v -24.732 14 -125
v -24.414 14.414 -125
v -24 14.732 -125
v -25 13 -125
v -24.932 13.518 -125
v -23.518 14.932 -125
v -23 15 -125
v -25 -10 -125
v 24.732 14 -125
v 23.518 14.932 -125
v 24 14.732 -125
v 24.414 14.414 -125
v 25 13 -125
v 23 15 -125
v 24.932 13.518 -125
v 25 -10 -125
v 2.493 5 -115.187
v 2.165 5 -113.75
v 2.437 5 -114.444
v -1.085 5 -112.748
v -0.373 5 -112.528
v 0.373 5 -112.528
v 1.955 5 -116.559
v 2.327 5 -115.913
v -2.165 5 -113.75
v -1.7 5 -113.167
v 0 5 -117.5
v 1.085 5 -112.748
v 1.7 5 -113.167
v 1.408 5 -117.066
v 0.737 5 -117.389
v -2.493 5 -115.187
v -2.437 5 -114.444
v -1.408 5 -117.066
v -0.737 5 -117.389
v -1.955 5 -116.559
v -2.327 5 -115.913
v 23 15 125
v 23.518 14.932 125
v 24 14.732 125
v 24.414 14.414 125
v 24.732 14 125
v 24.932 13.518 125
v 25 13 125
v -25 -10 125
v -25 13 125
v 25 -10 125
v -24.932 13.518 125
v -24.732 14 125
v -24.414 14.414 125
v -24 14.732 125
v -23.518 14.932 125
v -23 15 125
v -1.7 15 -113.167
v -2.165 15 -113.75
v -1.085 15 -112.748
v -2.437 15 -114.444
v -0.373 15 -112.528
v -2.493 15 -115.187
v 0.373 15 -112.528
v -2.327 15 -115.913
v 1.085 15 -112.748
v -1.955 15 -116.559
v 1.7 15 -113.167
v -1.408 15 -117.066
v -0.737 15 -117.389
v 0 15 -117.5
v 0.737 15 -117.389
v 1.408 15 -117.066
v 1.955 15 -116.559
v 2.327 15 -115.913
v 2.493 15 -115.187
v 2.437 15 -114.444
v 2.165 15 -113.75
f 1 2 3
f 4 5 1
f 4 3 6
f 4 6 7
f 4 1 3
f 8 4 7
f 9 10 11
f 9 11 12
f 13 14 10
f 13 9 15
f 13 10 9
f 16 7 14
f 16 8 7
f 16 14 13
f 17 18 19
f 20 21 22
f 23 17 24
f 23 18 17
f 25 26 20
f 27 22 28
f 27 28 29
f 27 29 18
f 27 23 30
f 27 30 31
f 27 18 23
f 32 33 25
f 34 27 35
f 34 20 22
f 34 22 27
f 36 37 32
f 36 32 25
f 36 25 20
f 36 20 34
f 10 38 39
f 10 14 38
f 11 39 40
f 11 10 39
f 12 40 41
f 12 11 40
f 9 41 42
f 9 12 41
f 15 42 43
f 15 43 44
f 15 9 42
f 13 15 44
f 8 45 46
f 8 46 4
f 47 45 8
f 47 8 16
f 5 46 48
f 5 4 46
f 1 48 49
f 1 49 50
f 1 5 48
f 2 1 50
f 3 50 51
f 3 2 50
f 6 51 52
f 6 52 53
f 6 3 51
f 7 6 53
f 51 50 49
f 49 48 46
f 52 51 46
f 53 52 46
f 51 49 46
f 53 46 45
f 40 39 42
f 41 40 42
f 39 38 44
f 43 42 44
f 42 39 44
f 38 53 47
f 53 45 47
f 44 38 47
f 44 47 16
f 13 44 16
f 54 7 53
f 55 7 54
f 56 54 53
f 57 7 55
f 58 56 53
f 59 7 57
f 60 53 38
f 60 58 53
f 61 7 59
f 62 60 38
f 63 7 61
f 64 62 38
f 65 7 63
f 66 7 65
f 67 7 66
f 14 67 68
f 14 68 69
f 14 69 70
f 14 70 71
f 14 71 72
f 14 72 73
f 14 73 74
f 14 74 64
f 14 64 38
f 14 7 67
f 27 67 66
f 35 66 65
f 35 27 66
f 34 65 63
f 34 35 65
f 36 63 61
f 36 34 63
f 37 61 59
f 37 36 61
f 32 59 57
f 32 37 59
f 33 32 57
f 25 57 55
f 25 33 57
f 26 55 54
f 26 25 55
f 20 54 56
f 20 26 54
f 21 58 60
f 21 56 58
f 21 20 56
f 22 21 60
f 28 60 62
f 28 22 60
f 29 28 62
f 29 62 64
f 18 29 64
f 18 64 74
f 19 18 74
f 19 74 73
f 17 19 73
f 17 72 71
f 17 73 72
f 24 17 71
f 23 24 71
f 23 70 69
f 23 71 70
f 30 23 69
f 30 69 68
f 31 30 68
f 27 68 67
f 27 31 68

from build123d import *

# Parameters (mm, degrees)
SKETCH1_W               = 50
SKETCH1_H               = 20
BOSS_EXTRUDE1_DEPTH     = 125
SKETCH3_W               = 50
SKETCH3_H               = 250
BOSS_EXTRUDE2_DEPTH     = 5
CUT_EXTRUDE1_DEPTH      = 130.903810568
CUT_EXTRUDE1_DEPTH_BACK = 10
SKETCH2_R               = 2.5
FILLET1_R               = 2


with BuildPart() as part:
    # Sketch1 → Boss-Extrude1 (new, symmetric)
    with BuildSketch(Plane.XY):
        Rectangle(SKETCH1_W, SKETCH1_H)
    extrude(amount=BOSS_EXTRUDE1_DEPTH, both=True)

    # Sketch3 → Boss-Extrude2 (add)
    with BuildSketch(Plane(origin=(0, 10, 0), x_dir=(1, 0, 0), z_dir=(0, 1, 0))):
        Rectangle(SKETCH3_W, SKETCH3_H)
    extrude(amount=BOSS_EXTRUDE2_DEPTH)

    # Sketch2 → Cut-Extrude1 (cut, two sides: drawn at the far end of the back side and taken through both)
    with BuildSketch(Plane(origin=(0, 15, 0), x_dir=(1, 0, 0), z_dir=(0, 1, 0)).offset(-CUT_EXTRUDE1_DEPTH_BACK)):
        with Locations(Location((0, 115, 0), (0, 0, 90))):
            Circle(SKETCH2_R)
    extrude(amount=CUT_EXTRUDE1_DEPTH + CUT_EXTRUDE1_DEPTH_BACK, mode=Mode.SUBTRACT)

    # Fillet1
    fillet1_edges = [part.edges().sort_by_distance(p)[0] for p in [
        (-25, 15, 0),
        (25, 15, 0),
    ]]
    fillet(fillet1_edges, radius=FILLET1_R)


solid = part.part
